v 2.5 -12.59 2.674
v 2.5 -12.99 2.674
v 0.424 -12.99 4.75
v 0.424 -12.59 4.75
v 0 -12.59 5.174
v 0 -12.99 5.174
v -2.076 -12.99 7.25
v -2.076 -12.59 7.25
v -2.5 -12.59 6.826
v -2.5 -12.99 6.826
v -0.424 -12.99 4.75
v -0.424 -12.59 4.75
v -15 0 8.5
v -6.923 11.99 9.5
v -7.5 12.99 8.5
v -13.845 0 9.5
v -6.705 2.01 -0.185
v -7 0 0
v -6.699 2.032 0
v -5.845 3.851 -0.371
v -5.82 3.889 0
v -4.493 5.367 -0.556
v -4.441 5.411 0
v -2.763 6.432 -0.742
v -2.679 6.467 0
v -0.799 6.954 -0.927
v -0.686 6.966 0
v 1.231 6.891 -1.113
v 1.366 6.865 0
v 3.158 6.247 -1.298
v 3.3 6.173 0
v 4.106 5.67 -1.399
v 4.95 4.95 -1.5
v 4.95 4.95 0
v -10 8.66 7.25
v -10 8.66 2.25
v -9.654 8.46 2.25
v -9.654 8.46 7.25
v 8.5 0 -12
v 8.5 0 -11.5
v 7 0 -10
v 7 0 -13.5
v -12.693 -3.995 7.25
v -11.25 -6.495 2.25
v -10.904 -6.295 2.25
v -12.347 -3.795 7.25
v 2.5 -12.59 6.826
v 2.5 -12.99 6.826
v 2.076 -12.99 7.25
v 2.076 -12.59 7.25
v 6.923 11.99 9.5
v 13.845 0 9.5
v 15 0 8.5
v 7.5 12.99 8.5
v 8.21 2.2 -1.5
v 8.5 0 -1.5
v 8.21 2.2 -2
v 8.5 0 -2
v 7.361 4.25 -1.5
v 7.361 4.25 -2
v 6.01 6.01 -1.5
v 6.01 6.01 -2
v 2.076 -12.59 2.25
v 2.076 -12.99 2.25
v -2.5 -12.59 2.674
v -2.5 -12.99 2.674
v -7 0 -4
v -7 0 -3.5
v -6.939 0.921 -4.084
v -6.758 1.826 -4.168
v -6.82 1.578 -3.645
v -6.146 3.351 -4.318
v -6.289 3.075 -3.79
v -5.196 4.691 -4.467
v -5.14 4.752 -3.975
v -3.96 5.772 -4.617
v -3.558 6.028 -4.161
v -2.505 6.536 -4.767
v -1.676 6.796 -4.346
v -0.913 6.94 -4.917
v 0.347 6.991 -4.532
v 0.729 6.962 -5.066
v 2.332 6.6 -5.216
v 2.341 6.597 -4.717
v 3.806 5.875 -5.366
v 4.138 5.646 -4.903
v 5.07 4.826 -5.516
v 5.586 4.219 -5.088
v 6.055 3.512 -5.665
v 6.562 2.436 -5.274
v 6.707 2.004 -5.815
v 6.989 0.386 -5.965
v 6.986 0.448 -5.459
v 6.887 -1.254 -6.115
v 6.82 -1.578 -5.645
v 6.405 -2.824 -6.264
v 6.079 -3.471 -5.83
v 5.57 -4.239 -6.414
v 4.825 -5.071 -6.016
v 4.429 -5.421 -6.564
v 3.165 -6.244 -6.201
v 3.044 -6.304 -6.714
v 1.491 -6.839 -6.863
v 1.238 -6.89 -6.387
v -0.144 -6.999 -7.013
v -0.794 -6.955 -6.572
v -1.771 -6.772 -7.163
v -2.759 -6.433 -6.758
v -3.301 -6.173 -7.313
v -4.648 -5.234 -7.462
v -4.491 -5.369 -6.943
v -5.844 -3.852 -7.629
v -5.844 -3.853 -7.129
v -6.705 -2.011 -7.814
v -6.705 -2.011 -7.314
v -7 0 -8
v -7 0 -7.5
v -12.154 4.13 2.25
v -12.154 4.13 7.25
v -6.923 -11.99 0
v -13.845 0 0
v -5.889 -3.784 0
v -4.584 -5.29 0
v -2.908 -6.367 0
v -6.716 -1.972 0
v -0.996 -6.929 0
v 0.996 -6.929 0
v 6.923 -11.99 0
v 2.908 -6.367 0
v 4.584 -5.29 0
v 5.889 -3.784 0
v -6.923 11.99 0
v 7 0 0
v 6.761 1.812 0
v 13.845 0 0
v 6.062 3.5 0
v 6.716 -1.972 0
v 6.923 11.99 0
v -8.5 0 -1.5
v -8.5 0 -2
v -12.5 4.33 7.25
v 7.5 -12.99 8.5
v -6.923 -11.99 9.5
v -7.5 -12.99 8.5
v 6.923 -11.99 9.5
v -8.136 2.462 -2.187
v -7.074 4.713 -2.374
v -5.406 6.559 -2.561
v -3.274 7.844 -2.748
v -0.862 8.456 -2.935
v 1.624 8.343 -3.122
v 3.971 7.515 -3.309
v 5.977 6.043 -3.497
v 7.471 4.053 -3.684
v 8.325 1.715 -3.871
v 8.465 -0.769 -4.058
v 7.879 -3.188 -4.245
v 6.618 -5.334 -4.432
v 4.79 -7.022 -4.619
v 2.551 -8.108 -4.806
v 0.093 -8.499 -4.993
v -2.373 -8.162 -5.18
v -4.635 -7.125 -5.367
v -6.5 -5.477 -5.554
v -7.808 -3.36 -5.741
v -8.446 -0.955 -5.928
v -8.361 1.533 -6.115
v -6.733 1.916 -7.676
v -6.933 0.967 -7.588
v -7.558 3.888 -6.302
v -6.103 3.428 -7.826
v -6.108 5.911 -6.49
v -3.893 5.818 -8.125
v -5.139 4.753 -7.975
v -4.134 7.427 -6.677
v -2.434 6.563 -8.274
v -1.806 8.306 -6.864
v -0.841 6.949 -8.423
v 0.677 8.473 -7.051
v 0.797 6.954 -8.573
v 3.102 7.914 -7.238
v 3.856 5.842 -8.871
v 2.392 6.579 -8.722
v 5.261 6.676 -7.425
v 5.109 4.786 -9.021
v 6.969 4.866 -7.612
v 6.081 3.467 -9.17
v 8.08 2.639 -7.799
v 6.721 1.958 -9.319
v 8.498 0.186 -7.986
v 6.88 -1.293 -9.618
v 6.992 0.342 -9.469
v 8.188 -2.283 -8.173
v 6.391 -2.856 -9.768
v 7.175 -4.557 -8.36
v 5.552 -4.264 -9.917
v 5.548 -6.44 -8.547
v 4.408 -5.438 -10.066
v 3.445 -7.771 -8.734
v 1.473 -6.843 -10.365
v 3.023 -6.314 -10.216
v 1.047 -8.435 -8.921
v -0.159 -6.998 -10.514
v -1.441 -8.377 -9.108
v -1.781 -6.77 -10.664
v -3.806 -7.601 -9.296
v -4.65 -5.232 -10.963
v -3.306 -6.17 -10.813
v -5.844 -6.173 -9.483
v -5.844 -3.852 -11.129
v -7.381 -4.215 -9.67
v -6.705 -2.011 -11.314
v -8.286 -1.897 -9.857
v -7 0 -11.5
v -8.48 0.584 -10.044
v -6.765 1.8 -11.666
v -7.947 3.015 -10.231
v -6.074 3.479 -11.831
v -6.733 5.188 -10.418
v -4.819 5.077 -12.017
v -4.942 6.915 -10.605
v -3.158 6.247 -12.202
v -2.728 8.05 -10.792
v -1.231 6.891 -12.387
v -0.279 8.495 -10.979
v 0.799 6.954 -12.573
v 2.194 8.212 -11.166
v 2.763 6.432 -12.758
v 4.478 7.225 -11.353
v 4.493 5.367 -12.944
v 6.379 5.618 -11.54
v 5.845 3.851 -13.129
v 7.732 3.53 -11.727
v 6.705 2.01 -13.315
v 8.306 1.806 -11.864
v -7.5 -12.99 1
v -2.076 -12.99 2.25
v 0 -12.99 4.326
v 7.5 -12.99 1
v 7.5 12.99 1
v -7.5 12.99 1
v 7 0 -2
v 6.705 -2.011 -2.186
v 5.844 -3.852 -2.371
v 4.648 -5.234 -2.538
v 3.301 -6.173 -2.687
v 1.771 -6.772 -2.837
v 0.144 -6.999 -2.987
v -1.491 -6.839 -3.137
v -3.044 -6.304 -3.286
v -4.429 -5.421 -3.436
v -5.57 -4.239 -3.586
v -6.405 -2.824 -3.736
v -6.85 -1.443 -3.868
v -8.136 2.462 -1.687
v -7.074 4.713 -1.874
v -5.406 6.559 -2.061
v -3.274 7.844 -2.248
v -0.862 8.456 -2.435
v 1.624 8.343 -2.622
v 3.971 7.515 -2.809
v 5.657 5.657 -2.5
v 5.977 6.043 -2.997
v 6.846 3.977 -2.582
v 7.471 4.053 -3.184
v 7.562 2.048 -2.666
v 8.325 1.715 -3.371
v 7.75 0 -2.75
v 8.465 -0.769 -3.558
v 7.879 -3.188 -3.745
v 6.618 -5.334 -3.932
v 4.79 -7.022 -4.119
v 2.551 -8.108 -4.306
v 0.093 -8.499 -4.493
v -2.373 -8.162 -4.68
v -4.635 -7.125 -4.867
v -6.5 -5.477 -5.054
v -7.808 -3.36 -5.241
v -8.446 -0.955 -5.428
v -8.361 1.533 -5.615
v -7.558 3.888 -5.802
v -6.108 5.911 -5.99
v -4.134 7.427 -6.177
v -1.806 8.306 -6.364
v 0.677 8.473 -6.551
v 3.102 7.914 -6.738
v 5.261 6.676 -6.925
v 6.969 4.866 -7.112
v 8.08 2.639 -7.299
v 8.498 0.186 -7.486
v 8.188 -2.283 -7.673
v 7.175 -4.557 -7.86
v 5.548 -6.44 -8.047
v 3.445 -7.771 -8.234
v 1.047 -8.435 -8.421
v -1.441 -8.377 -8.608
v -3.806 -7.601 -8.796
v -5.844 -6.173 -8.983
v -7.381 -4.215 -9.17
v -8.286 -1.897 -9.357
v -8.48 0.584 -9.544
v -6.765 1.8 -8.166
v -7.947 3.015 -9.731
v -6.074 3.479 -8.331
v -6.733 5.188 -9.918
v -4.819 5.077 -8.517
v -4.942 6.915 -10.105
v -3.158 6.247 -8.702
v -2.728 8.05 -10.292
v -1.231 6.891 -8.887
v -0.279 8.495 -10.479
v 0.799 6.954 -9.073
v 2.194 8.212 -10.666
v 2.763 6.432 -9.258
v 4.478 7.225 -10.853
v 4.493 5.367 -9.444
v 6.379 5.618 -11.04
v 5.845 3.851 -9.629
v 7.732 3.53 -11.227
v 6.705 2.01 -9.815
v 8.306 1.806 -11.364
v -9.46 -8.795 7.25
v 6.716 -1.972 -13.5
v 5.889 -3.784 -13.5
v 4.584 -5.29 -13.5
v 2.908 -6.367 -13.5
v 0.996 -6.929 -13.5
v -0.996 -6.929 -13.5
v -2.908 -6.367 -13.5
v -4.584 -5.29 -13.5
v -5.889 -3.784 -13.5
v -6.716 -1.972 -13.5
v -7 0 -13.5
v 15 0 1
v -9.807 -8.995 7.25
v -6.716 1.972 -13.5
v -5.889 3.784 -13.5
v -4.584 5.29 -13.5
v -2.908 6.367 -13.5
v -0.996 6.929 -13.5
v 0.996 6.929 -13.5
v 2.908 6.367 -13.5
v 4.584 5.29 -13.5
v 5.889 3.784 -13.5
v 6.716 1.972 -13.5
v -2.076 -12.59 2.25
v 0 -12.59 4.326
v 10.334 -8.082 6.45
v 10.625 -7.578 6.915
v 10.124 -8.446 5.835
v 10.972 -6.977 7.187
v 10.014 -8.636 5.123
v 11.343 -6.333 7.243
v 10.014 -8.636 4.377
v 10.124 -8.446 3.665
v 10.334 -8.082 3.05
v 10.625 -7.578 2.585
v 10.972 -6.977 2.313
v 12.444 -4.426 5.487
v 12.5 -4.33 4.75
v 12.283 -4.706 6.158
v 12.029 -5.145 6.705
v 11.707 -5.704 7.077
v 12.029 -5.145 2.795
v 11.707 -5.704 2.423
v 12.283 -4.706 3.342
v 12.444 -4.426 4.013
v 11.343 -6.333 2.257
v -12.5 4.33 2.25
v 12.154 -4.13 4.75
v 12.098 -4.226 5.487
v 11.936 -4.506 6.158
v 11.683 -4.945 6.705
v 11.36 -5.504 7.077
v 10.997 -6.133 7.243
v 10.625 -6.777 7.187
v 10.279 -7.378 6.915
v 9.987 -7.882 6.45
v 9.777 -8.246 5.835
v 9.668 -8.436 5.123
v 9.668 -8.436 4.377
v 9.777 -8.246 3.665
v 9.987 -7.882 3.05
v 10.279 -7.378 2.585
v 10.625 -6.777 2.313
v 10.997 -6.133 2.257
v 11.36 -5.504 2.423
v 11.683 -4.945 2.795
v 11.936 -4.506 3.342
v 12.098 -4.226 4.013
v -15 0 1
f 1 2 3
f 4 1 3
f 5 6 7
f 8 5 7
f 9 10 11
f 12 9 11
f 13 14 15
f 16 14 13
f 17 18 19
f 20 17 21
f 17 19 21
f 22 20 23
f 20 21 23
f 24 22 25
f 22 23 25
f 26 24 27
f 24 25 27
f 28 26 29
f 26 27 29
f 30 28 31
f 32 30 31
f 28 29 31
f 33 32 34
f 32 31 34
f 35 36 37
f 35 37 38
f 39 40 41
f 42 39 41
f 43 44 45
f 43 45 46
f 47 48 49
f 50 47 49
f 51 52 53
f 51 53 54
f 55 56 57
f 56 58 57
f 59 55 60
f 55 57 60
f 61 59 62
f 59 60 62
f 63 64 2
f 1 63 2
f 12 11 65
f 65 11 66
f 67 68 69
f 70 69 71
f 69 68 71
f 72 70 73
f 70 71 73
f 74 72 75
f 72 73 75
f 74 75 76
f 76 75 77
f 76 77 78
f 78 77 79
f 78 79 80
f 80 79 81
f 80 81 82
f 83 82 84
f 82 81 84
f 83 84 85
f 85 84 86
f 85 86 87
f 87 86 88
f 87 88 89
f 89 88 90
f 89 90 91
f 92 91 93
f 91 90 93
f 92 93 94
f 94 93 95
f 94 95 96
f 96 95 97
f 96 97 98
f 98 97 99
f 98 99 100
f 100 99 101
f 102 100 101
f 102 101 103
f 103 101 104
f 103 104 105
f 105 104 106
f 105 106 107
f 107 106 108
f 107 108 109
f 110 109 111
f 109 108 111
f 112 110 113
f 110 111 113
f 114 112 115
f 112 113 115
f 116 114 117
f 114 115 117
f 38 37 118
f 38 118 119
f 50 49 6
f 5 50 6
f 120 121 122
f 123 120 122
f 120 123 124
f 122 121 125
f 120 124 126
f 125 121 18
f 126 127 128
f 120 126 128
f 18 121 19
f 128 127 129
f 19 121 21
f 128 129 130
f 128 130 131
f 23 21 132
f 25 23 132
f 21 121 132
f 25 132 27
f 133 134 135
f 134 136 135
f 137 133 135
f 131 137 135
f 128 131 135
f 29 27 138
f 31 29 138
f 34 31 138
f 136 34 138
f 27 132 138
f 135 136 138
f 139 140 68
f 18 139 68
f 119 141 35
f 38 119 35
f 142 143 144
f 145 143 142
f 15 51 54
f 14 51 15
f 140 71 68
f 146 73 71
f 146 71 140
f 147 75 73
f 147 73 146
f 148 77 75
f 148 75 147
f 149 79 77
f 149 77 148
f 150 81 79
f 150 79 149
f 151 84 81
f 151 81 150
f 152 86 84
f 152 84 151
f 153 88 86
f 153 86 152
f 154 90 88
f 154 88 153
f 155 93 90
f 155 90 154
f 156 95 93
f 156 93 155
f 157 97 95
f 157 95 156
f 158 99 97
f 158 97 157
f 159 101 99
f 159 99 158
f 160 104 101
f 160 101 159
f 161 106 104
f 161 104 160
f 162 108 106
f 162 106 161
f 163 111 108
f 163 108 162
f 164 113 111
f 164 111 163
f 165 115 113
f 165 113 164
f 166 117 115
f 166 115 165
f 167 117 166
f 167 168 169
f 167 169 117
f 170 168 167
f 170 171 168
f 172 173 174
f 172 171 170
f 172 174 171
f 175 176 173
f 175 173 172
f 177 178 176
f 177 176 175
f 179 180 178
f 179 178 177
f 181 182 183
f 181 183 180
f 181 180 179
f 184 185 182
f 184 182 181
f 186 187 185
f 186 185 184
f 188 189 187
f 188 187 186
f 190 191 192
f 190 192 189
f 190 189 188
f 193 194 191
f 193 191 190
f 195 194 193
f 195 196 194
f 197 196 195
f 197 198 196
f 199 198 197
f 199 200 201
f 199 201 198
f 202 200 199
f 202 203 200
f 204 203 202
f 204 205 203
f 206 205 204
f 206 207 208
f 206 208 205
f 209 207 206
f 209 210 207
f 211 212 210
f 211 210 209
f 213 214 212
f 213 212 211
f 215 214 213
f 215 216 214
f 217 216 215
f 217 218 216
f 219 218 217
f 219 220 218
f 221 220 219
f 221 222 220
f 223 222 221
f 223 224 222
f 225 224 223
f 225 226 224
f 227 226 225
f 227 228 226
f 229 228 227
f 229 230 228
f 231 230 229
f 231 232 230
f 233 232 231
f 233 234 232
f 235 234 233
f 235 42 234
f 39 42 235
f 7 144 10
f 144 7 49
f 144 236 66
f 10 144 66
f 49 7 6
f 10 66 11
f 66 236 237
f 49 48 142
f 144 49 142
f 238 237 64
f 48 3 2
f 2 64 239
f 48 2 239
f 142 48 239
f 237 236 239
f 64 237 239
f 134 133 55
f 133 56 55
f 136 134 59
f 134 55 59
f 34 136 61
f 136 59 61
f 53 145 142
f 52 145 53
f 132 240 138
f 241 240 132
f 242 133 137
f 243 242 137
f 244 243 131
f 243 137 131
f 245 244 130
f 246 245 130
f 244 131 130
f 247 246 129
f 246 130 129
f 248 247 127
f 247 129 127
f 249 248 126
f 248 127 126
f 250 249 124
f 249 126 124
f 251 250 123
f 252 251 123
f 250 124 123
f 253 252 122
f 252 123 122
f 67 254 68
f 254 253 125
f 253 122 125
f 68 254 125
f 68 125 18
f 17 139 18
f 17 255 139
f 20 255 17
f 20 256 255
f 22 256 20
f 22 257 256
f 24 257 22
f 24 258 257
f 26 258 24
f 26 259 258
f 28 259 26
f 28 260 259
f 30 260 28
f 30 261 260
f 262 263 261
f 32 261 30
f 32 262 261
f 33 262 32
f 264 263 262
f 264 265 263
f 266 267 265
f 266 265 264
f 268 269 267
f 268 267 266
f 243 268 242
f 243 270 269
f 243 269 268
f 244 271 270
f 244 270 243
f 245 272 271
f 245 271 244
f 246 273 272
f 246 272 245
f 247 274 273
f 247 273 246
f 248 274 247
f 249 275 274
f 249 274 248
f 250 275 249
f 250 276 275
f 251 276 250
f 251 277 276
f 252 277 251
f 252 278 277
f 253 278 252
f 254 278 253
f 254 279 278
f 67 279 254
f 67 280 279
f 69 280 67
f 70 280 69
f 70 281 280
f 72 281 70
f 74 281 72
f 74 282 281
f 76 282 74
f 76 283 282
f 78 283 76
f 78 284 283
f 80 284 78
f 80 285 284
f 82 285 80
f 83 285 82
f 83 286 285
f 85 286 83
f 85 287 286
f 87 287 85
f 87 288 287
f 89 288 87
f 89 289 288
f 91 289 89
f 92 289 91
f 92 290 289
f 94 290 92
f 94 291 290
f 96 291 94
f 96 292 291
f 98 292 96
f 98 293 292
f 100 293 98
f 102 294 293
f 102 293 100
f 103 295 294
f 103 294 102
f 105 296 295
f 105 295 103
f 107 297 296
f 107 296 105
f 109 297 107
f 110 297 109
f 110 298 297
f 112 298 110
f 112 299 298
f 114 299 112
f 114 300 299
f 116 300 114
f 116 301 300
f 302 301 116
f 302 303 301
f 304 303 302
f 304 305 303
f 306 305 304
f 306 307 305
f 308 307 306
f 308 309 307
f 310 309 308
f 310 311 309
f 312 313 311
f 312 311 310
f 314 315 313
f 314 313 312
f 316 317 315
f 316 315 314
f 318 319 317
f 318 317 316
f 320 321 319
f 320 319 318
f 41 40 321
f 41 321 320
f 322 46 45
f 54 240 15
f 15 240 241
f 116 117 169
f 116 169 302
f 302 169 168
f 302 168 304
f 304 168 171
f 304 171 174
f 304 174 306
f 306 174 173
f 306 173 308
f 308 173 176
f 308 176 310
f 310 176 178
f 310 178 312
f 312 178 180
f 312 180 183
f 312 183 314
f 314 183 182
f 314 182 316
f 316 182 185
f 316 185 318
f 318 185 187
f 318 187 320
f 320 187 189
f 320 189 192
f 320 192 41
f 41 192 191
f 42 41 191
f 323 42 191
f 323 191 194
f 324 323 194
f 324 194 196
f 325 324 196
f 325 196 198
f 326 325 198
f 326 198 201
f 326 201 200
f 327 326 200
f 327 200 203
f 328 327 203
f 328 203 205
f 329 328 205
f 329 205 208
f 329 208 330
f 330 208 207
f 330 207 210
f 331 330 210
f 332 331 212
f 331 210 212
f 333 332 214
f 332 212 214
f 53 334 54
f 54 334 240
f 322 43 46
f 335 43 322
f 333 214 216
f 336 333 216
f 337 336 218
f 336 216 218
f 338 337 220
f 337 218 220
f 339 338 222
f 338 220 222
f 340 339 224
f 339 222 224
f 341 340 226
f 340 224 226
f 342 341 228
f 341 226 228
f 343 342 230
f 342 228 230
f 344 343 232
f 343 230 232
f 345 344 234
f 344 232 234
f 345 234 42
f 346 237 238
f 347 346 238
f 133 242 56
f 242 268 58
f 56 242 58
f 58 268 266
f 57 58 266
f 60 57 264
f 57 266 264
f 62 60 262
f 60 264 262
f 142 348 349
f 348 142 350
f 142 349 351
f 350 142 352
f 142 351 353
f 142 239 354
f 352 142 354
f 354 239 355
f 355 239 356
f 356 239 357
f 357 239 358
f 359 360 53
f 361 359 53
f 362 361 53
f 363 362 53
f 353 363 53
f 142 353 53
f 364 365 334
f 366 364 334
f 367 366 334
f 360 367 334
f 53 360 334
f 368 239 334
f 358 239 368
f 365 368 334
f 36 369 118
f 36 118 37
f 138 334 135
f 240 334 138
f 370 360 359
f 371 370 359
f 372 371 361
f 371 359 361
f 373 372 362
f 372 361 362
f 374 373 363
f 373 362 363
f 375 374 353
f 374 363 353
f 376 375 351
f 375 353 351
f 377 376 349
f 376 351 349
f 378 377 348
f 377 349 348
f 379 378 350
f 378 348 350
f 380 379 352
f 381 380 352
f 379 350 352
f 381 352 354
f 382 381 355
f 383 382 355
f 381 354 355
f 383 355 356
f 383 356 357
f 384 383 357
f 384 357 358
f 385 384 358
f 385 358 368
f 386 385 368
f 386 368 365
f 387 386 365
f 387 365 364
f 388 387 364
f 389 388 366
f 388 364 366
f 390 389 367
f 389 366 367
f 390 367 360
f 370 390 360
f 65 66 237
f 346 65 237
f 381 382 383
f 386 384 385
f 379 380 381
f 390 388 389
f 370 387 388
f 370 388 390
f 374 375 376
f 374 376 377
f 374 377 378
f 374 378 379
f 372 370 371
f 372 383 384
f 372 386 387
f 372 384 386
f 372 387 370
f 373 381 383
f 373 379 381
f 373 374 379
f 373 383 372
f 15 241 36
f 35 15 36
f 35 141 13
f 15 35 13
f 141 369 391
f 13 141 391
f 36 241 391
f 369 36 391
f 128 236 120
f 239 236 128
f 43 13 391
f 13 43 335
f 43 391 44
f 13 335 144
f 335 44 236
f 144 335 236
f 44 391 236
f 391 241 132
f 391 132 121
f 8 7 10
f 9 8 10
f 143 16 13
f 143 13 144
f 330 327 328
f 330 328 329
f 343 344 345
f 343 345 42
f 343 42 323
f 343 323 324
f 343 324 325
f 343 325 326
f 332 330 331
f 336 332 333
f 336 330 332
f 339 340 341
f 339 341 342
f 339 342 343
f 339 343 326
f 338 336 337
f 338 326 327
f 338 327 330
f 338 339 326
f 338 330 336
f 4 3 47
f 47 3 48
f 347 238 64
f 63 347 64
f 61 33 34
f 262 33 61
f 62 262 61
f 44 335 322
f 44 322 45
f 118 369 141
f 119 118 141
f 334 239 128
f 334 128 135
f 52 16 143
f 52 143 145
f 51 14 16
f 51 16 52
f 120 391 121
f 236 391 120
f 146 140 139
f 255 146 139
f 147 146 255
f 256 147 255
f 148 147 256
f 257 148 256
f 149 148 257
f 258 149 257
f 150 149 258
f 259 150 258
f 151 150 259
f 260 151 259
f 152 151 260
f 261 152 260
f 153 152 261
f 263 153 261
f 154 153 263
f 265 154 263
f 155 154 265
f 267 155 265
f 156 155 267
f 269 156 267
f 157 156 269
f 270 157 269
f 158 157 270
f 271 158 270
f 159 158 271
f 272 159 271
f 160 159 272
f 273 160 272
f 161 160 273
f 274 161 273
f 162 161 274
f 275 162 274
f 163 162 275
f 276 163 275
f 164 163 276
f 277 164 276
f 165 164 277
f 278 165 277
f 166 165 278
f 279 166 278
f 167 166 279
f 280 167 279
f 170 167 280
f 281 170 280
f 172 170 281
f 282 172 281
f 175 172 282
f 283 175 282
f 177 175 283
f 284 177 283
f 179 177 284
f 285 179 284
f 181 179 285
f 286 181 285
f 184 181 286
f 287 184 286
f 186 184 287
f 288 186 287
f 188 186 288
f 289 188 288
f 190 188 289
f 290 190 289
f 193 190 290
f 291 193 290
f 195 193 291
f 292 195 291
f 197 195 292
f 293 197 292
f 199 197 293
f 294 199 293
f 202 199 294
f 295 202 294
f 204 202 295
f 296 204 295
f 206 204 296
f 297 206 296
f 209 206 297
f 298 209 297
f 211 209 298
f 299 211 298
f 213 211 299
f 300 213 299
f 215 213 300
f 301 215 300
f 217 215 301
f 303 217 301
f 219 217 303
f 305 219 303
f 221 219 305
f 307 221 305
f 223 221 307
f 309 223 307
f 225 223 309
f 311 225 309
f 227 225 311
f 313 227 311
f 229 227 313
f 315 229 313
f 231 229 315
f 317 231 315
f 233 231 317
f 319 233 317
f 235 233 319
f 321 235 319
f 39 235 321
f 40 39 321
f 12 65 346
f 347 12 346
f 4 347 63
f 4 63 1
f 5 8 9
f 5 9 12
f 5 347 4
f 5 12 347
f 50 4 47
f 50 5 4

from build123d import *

# Parameters (mm, degrees)
EXTRUDE_1_DEPTH     = 9.5
SKETCH_6_R          = 7
EXTRUDE_2_DEPTH     = 13.5
SWEEP_1_PITCH       = 4
SWEEP_1_HEIGHT      = 10
SWEEP_1_RADIUS      = 7
REVOLVE_2_ANGLE     = 45
CHAMFER_1_SIZE      = 1
CUT_EXTRUDE_2_DEPTH = 0.4
SKETCH_13_R         = 2.5
CUT_EXTRUDE_3_DEPTH = 0.4
CUT_EXTRUDE_4_DEPTH = 0.4
SKETCH_14_W         = 5
SKETCH_14_H         = 5
CUT_EXTRUDE_5_DEPTH = 0.4


with BuildPart() as part:
    # 草图1 → 凸台-拉伸1 (new body)
    with BuildSketch(Plane.XY):
        Polygon((15, 0), (7.5, 12.990381057), (-7.5, 12.990381057), (-15, 0), (-7.5, -12.990381057), (7.5, -12.990381057), align=None)
    extrude(amount=EXTRUDE_1_DEPTH)

    # 草图6 → 凸台-拉伸2 (add)
    with BuildSketch(Plane(origin=(0, 0, 0), x_dir=(-1, 0, 0), z_dir=(0, 0, -1))):
        Circle(SKETCH_6_R)
    extrude(amount=EXTRUDE_2_DEPTH)

    # 扫描1: sweep along a helix
    with BuildLine() as sweep_1_path:
        Helix(SWEEP_1_PITCH, SWEEP_1_HEIGHT, SWEEP_1_RADIUS, center=(0, 0, -1.75), direction=(0, 0, -1))
    # 草图8 → 扫描1 (sweep)
    with BuildSketch(Plane(origin=(0, 0, 0), x_dir=(1, 0, 0), z_dir=(0, 1, 0))):
        Polygon((-7, 3.5), (-7, 0), (-8.5, 1.5), (-8.5, 2), align=None)
    sweep(path=sweep_1_path.line, is_frenet=True)

    # 草图9 → 旋转2 (revolve)
    with BuildSketch(Plane(origin=(0, 0, 0), x_dir=(1, 0, 0), z_dir=(0, 1, 0))):
        Polygon((7, 3.5), (7, 0), (8.5, 1.5), (8.5, 2), align=None)
    revolve(axis=Axis((0, 0, 0), (0, 0, 1)), revolution_arc=REVOLVE_2_ANGLE)

    # 倒角1
    chamfer_1_edges = [part.edges().sort_by_distance(p)[0] for p in [
        (-11.25, 6.495190528, 9.5),
        (-11.25, -6.495190528, 9.5),
        (0, -12.990381057, 9.5),
        (11.25, -6.495190528, 9.5),
        (11.25, 6.495190528, 9.5),
        (11.25, -6.495190528, 0),
        (0, -12.990381057, 0),
        (-11.25, -6.495190528, 0),
        (-11.25, 6.495190528, 0),
        (0, 12.990381057, 0),
        (11.25, 6.495190528, 0),
        (0, 12.990381057, 9.5),
    ]]
    chamfer(chamfer_1_edges, length=CHAMFER_1_SIZE)

    # 草图11 → 切除-拉伸2 (cut)
    with BuildSketch(Plane(origin=(-11.25, -6.495190528, 0), x_dir=(0, 0, 1), z_dir=(-0.8660254037844389, -0.4999999999999995, 0))):
        Polygon((2.25, 0), (7.25, 2.886751346), (7.25, -2.886751346), align=None)
    extrude(amount=-CUT_EXTRUDE_2_DEPTH, mode=Mode.SUBTRACT)

    # 草图13 → 切除-拉伸3 (cut)
    with BuildSketch(Plane(origin=(11.25, -6.495190528, 0), x_dir=(0, 0, -1), z_dir=(0.8660254037844387, -0.5000000000000001, 0))):
        with Locations(Location((-4.75, 0, 0), (0, 0, 90))):
            Circle(SKETCH_13_R)
    extrude(amount=-CUT_EXTRUDE_3_DEPTH, mode=Mode.SUBTRACT)

    # 草图12 → 切除-拉伸4 (cut)
    with BuildSketch(Plane.XZ.offset(12.990381057)):
        Polygon((-2.5, 6.825735931), (2.075735931, 2.25), (2.5, 2.674264069), (-2.075735931, 7.25), align=None)
        Polygon((2.075735931, 7.25), (-2.5, 2.674264069), (-2.075735931, 2.25), (2.5, 6.825735931), align=None)
    extrude(amount=-CUT_EXTRUDE_4_DEPTH, mode=Mode.SUBTRACT)

    # 草图14 → 切除-拉伸5 (cut)
    with BuildSketch(Plane(origin=(-11.25, 6.495190528, 0), x_dir=(0, 0, 1), z_dir=(-0.8660254037844384, 0.5000000000000006, 0))):
        with Locations((4.75, 0)):
            Rectangle(SKETCH_14_W, SKETCH_14_H)
    extrude(amount=-CUT_EXTRUDE_5_DEPTH, mode=Mode.SUBTRACT)


solid = part.part
